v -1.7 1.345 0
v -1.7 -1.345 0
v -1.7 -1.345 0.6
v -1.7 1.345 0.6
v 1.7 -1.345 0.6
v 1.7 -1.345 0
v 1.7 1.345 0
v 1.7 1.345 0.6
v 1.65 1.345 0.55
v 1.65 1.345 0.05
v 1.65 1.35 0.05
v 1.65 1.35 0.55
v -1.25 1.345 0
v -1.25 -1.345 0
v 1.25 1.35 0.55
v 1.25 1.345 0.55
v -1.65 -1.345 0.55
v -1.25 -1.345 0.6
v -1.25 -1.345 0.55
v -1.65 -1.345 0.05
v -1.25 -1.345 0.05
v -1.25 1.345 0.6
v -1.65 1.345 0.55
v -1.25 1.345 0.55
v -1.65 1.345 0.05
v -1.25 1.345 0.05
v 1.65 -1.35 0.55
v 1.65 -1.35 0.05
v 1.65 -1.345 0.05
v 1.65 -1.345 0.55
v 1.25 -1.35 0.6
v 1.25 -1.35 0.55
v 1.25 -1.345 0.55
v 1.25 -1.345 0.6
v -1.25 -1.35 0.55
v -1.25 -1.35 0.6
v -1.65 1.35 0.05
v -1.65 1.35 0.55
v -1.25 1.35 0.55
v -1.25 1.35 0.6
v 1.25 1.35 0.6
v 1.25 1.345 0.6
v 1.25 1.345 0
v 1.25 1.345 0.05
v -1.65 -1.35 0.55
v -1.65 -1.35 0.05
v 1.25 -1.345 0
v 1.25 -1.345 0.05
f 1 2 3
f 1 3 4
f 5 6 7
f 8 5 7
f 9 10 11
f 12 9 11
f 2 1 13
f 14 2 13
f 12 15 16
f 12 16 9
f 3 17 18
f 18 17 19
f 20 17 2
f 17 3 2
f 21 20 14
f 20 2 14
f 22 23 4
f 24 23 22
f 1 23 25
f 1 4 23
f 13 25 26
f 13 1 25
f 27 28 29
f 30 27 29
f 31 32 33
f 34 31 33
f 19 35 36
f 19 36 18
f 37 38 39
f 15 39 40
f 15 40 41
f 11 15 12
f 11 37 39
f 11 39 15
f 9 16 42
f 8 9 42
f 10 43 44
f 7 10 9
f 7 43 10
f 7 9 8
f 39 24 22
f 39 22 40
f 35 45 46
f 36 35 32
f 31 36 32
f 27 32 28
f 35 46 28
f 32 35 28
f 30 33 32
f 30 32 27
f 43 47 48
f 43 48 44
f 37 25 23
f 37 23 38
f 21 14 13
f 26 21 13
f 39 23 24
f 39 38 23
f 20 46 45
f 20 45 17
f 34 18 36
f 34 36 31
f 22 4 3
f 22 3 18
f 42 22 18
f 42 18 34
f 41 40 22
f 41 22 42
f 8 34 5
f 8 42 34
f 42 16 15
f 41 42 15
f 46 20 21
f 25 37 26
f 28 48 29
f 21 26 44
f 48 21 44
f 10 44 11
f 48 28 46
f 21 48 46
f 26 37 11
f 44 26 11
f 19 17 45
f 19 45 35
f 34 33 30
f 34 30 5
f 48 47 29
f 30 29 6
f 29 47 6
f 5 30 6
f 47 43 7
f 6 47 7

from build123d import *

# Parameters (mm, degrees)
PLATING_LEFT_W      = 0.45
PLATING_LEFT_H      = 2.69
PLATING_LEFT_DEPTH  = 0.6
PLATING_RIGHT_W     = 0.45
PLATING_RIGHT_H     = 2.69
PLATING_RIGHT_DEPTH = 0.6
MARKING_W           = 2.5
MARKING_H           = 2.7
MARKING_DEPTH       = 0.05
CHIP_W              = 3.3
CHIP_H              = 2.7
CHIP_DEPTH          = 0.5


with BuildPart() as plating_left:
    # plating_left → plating_left (new body)
    with BuildSketch(Plane(origin=(-1.7, -1.345, 0), x_dir=(1, 0, 0), z_dir=(0, 0, 1))):
        with Locations((0.225, 1.345)):
            Rectangle(PLATING_LEFT_W, PLATING_LEFT_H)
    extrude(amount=PLATING_LEFT_DEPTH)


with BuildPart() as plating_right:
    # plating_right → plating_right (new body)
    with BuildSketch(Plane(origin=(1.25, -1.345, 0), x_dir=(1, 0, 0), z_dir=(0, 0, 1))):
        with Locations((0.225, 1.345)):
            Rectangle(PLATING_RIGHT_W, PLATING_RIGHT_H)
    extrude(amount=PLATING_RIGHT_DEPTH)


with BuildPart() as marking:
    # marking → marking (new body)
    with BuildSketch(Plane(origin=(-1.25, -1.35, 0.55), x_dir=(1, 0, 0), z_dir=(0, 0, 1))):
        with Locations((1.25, 1.35)):
            Rectangle(MARKING_W, MARKING_H)
    extrude(amount=MARKING_DEPTH)


with BuildPart() as resistor:
    # chip → chip (new body)
    with BuildSketch(Plane(origin=(-1.65, -1.35, 0.05), x_dir=(1, 0, 0), z_dir=(0, 0, 1))):
        with Locations((1.65, 1.35)):
            Rectangle(CHIP_W, CHIP_H)
    extrude(amount=CHIP_DEPTH)

    # resistor: union plating_left, plating_right, marking
    add(plating_left.part)
    add(plating_right.part)
    add(marking.part)


solid = resistor.part
